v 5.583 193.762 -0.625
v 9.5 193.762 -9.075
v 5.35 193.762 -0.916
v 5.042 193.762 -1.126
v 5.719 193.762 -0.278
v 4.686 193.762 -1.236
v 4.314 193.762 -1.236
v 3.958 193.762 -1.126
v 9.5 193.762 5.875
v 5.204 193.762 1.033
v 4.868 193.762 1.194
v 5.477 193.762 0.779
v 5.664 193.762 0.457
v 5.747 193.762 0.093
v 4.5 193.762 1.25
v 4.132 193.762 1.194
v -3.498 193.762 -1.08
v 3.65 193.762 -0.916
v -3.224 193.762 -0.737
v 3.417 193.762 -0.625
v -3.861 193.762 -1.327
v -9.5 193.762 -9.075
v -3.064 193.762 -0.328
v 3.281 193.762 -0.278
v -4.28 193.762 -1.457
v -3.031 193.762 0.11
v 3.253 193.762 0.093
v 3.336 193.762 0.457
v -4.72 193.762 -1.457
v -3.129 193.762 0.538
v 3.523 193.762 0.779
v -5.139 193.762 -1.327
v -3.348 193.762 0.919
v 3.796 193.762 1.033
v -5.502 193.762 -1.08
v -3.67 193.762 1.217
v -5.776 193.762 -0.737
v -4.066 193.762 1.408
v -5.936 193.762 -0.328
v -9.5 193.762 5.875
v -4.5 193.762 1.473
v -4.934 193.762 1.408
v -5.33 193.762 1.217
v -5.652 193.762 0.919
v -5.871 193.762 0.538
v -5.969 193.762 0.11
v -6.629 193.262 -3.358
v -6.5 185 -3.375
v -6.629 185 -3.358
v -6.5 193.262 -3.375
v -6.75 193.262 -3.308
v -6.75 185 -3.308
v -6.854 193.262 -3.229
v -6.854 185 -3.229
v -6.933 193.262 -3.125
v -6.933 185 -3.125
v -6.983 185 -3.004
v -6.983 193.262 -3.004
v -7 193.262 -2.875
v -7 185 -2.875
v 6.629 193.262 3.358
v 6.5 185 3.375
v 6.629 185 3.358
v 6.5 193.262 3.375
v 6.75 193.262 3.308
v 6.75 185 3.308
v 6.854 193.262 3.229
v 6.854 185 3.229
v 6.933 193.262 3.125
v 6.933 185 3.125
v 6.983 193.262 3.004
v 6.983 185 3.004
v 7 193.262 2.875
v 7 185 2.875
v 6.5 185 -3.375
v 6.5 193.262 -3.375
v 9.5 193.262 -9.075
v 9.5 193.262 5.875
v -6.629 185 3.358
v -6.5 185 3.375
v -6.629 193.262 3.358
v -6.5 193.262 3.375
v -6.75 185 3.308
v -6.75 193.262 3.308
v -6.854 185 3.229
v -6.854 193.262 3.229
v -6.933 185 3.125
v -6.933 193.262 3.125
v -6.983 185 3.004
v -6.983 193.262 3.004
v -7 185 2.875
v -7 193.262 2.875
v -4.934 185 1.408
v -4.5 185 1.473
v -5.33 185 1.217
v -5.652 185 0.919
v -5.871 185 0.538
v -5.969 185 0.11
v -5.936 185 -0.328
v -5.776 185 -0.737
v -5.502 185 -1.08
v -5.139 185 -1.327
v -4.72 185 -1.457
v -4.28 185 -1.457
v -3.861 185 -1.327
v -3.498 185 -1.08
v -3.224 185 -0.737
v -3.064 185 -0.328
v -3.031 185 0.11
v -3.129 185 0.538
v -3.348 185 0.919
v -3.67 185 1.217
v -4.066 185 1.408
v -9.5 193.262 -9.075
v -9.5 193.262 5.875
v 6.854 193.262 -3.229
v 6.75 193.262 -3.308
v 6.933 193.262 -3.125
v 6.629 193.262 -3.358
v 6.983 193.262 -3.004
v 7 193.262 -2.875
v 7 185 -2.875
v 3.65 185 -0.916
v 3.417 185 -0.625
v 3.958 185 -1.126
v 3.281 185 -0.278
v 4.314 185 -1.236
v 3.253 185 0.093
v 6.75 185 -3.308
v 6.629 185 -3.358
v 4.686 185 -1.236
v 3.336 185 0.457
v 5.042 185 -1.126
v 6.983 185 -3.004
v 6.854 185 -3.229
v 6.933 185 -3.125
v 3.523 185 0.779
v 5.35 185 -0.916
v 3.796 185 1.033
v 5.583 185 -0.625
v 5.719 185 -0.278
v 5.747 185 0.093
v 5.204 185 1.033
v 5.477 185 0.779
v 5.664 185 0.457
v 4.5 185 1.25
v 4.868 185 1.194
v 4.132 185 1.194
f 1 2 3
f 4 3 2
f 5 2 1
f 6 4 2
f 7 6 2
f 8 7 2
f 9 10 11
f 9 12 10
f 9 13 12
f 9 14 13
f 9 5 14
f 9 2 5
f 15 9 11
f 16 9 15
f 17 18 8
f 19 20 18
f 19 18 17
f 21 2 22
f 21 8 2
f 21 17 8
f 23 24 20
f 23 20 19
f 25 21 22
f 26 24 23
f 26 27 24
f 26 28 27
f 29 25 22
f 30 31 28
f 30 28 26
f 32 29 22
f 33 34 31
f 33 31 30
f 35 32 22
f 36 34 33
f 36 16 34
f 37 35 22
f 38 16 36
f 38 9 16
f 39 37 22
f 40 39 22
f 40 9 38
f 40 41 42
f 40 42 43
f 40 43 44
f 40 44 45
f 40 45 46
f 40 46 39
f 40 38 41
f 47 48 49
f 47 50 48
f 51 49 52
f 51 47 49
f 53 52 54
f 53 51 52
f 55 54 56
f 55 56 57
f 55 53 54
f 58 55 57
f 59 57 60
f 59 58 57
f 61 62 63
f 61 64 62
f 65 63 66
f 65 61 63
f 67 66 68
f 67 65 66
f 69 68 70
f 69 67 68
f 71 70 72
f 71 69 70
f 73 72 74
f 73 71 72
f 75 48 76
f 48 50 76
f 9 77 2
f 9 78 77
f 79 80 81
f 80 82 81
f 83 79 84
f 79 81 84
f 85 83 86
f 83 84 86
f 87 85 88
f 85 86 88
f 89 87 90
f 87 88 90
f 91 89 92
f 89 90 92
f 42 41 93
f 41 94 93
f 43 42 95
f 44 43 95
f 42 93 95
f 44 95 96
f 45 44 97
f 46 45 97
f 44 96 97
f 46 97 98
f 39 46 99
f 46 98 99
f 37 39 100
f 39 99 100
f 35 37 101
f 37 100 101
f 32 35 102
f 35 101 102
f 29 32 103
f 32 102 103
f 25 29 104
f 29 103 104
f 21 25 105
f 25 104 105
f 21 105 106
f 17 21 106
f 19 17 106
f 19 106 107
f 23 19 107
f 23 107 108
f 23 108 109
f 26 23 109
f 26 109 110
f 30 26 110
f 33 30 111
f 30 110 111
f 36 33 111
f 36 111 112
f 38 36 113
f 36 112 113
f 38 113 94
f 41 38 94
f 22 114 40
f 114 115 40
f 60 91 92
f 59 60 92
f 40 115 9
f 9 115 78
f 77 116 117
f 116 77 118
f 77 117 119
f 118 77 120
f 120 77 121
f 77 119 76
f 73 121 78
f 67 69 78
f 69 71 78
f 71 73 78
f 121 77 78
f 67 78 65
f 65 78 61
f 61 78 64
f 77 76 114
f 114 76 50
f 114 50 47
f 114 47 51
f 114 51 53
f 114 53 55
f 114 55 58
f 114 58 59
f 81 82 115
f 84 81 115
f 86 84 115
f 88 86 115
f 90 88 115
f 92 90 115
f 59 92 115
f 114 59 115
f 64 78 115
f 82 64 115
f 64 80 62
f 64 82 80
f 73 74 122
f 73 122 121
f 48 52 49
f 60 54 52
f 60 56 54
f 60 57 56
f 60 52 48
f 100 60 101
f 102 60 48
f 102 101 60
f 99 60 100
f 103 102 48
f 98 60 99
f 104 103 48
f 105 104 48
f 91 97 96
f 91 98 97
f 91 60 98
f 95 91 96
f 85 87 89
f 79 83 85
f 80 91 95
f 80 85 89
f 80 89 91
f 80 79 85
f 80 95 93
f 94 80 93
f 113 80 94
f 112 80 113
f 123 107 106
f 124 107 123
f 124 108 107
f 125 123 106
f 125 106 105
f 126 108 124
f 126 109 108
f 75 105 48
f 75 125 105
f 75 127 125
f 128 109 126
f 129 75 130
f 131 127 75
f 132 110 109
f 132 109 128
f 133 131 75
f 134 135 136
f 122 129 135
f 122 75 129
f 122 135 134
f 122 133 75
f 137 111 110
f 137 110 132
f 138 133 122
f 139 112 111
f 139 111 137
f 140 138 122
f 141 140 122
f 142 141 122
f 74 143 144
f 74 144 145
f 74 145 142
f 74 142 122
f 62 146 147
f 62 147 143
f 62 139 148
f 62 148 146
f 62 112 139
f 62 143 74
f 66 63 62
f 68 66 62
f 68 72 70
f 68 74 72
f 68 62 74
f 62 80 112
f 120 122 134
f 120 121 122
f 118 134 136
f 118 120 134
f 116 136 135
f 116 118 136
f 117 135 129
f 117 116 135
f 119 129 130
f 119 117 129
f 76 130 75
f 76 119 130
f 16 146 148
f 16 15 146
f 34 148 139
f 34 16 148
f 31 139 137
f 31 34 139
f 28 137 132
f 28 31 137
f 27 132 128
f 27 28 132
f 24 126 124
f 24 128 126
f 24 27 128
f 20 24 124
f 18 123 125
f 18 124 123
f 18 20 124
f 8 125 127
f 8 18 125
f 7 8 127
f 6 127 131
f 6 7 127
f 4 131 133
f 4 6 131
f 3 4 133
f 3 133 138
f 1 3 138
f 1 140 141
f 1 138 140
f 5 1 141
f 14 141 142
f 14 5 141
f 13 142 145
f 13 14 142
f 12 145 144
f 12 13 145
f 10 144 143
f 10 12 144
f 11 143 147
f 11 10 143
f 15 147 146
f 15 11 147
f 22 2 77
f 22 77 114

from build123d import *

# Parameters (mm, degrees)
SKETCH1_W           = 14
SKETCH1_H           = 8.2625
EXTRUDE1_DEPTH      = 3.375
SKETCH4_W           = 19
SKETCH4_H           = 11.75
EXTRUDE2_DEPTH      = 0.5
SKETCH2_W           = 1.4732
SKETCH2_H           = 16.500973173
SKETCH3_W           = 1.25
SKETCH3_H           = 20
FILLET1_R           = 0.5
SKETCH6_W           = 19
SKETCH6_H           = 0.5
BOSS_EXTRUDE2_DEPTH = 3.2


with BuildPart() as part:
    # Sketch1 → Extrude1 (new body, symmetric)
    with BuildSketch(Plane.XY):
        with Locations((0, 189.13125)):
            Rectangle(SKETCH1_W, SKETCH1_H)
    extrude(amount=EXTRUDE1_DEPTH, both=True)

    # Sketch4 → Extrude2 (add)
    with BuildSketch(Plane(origin=(0, 193.2625, 0), x_dir=(1, 0, 0), z_dir=(0, 1, 0))):
        Rectangle(SKETCH4_W, SKETCH4_H)
    extrude(amount=EXTRUDE2_DEPTH)

    # Sketch2 → Cut-Revolve1 (revolve, cut)
    with BuildSketch(Plane(origin=(9.451328919, 219.930638069, 0), x_dir=(1, 0, 0), z_dir=(0, 0, -1)), mode=Mode.PRIVATE) as cut_revolve1_sk:
        with Locations((-13.214728919, 29.739409073)):
            Rectangle(SKETCH2_W, SKETCH2_H)
    revolve(cut_revolve1_sk.sketch.rotate(Axis((-4.5, 202.803113019, 0), (0, -1, 0)), 90), axis=Axis((-4.5, 202.803113019, 0), (0, -1, 0)), mode=Mode.SUBTRACT)  # turned: the seam where the file's is

    # Sketch3 → Cut-Revolve2 (revolve, cut)
    with BuildSketch(Plane.XY, mode=Mode.PRIVATE) as cut_revolve2_sk:
        with Locations((5.125, 191.895853695)):
            Rectangle(SKETCH3_W, SKETCH3_H)
    revolve(cut_revolve2_sk.sketch.rotate(Axis((4.5, 219.496854939, 0), (0, -1, 0)), 90), axis=Axis((4.5, 219.496854939, 0), (0, -1, 0)), mode=Mode.SUBTRACT)  # turned: the seam where the file's is

    # Fillet1
    fillet1_edges = [part.edges().sort_by_distance(p)[0] for p in [
        (7, 189.13125, 3.375),
        (-7, 189.13125, 3.375),
        (7, 189.13125, -3.375),
        (-7, 189.13125, -3.375),
    ]]
    fillet(fillet1_edges, radius=FILLET1_R)

    # Sketch6 → Boss-Extrude2 (add)
    with BuildSketch(Plane(origin=(0, 0, -5.875), x_dir=(-1, 0, 0), z_dir=(0, 0, -1))):
        with Locations((0, 193.5125)):
            Rectangle(SKETCH6_W, SKETCH6_H)
    extrude(amount=BOSS_EXTRUDE2_DEPTH)


solid = part.part
